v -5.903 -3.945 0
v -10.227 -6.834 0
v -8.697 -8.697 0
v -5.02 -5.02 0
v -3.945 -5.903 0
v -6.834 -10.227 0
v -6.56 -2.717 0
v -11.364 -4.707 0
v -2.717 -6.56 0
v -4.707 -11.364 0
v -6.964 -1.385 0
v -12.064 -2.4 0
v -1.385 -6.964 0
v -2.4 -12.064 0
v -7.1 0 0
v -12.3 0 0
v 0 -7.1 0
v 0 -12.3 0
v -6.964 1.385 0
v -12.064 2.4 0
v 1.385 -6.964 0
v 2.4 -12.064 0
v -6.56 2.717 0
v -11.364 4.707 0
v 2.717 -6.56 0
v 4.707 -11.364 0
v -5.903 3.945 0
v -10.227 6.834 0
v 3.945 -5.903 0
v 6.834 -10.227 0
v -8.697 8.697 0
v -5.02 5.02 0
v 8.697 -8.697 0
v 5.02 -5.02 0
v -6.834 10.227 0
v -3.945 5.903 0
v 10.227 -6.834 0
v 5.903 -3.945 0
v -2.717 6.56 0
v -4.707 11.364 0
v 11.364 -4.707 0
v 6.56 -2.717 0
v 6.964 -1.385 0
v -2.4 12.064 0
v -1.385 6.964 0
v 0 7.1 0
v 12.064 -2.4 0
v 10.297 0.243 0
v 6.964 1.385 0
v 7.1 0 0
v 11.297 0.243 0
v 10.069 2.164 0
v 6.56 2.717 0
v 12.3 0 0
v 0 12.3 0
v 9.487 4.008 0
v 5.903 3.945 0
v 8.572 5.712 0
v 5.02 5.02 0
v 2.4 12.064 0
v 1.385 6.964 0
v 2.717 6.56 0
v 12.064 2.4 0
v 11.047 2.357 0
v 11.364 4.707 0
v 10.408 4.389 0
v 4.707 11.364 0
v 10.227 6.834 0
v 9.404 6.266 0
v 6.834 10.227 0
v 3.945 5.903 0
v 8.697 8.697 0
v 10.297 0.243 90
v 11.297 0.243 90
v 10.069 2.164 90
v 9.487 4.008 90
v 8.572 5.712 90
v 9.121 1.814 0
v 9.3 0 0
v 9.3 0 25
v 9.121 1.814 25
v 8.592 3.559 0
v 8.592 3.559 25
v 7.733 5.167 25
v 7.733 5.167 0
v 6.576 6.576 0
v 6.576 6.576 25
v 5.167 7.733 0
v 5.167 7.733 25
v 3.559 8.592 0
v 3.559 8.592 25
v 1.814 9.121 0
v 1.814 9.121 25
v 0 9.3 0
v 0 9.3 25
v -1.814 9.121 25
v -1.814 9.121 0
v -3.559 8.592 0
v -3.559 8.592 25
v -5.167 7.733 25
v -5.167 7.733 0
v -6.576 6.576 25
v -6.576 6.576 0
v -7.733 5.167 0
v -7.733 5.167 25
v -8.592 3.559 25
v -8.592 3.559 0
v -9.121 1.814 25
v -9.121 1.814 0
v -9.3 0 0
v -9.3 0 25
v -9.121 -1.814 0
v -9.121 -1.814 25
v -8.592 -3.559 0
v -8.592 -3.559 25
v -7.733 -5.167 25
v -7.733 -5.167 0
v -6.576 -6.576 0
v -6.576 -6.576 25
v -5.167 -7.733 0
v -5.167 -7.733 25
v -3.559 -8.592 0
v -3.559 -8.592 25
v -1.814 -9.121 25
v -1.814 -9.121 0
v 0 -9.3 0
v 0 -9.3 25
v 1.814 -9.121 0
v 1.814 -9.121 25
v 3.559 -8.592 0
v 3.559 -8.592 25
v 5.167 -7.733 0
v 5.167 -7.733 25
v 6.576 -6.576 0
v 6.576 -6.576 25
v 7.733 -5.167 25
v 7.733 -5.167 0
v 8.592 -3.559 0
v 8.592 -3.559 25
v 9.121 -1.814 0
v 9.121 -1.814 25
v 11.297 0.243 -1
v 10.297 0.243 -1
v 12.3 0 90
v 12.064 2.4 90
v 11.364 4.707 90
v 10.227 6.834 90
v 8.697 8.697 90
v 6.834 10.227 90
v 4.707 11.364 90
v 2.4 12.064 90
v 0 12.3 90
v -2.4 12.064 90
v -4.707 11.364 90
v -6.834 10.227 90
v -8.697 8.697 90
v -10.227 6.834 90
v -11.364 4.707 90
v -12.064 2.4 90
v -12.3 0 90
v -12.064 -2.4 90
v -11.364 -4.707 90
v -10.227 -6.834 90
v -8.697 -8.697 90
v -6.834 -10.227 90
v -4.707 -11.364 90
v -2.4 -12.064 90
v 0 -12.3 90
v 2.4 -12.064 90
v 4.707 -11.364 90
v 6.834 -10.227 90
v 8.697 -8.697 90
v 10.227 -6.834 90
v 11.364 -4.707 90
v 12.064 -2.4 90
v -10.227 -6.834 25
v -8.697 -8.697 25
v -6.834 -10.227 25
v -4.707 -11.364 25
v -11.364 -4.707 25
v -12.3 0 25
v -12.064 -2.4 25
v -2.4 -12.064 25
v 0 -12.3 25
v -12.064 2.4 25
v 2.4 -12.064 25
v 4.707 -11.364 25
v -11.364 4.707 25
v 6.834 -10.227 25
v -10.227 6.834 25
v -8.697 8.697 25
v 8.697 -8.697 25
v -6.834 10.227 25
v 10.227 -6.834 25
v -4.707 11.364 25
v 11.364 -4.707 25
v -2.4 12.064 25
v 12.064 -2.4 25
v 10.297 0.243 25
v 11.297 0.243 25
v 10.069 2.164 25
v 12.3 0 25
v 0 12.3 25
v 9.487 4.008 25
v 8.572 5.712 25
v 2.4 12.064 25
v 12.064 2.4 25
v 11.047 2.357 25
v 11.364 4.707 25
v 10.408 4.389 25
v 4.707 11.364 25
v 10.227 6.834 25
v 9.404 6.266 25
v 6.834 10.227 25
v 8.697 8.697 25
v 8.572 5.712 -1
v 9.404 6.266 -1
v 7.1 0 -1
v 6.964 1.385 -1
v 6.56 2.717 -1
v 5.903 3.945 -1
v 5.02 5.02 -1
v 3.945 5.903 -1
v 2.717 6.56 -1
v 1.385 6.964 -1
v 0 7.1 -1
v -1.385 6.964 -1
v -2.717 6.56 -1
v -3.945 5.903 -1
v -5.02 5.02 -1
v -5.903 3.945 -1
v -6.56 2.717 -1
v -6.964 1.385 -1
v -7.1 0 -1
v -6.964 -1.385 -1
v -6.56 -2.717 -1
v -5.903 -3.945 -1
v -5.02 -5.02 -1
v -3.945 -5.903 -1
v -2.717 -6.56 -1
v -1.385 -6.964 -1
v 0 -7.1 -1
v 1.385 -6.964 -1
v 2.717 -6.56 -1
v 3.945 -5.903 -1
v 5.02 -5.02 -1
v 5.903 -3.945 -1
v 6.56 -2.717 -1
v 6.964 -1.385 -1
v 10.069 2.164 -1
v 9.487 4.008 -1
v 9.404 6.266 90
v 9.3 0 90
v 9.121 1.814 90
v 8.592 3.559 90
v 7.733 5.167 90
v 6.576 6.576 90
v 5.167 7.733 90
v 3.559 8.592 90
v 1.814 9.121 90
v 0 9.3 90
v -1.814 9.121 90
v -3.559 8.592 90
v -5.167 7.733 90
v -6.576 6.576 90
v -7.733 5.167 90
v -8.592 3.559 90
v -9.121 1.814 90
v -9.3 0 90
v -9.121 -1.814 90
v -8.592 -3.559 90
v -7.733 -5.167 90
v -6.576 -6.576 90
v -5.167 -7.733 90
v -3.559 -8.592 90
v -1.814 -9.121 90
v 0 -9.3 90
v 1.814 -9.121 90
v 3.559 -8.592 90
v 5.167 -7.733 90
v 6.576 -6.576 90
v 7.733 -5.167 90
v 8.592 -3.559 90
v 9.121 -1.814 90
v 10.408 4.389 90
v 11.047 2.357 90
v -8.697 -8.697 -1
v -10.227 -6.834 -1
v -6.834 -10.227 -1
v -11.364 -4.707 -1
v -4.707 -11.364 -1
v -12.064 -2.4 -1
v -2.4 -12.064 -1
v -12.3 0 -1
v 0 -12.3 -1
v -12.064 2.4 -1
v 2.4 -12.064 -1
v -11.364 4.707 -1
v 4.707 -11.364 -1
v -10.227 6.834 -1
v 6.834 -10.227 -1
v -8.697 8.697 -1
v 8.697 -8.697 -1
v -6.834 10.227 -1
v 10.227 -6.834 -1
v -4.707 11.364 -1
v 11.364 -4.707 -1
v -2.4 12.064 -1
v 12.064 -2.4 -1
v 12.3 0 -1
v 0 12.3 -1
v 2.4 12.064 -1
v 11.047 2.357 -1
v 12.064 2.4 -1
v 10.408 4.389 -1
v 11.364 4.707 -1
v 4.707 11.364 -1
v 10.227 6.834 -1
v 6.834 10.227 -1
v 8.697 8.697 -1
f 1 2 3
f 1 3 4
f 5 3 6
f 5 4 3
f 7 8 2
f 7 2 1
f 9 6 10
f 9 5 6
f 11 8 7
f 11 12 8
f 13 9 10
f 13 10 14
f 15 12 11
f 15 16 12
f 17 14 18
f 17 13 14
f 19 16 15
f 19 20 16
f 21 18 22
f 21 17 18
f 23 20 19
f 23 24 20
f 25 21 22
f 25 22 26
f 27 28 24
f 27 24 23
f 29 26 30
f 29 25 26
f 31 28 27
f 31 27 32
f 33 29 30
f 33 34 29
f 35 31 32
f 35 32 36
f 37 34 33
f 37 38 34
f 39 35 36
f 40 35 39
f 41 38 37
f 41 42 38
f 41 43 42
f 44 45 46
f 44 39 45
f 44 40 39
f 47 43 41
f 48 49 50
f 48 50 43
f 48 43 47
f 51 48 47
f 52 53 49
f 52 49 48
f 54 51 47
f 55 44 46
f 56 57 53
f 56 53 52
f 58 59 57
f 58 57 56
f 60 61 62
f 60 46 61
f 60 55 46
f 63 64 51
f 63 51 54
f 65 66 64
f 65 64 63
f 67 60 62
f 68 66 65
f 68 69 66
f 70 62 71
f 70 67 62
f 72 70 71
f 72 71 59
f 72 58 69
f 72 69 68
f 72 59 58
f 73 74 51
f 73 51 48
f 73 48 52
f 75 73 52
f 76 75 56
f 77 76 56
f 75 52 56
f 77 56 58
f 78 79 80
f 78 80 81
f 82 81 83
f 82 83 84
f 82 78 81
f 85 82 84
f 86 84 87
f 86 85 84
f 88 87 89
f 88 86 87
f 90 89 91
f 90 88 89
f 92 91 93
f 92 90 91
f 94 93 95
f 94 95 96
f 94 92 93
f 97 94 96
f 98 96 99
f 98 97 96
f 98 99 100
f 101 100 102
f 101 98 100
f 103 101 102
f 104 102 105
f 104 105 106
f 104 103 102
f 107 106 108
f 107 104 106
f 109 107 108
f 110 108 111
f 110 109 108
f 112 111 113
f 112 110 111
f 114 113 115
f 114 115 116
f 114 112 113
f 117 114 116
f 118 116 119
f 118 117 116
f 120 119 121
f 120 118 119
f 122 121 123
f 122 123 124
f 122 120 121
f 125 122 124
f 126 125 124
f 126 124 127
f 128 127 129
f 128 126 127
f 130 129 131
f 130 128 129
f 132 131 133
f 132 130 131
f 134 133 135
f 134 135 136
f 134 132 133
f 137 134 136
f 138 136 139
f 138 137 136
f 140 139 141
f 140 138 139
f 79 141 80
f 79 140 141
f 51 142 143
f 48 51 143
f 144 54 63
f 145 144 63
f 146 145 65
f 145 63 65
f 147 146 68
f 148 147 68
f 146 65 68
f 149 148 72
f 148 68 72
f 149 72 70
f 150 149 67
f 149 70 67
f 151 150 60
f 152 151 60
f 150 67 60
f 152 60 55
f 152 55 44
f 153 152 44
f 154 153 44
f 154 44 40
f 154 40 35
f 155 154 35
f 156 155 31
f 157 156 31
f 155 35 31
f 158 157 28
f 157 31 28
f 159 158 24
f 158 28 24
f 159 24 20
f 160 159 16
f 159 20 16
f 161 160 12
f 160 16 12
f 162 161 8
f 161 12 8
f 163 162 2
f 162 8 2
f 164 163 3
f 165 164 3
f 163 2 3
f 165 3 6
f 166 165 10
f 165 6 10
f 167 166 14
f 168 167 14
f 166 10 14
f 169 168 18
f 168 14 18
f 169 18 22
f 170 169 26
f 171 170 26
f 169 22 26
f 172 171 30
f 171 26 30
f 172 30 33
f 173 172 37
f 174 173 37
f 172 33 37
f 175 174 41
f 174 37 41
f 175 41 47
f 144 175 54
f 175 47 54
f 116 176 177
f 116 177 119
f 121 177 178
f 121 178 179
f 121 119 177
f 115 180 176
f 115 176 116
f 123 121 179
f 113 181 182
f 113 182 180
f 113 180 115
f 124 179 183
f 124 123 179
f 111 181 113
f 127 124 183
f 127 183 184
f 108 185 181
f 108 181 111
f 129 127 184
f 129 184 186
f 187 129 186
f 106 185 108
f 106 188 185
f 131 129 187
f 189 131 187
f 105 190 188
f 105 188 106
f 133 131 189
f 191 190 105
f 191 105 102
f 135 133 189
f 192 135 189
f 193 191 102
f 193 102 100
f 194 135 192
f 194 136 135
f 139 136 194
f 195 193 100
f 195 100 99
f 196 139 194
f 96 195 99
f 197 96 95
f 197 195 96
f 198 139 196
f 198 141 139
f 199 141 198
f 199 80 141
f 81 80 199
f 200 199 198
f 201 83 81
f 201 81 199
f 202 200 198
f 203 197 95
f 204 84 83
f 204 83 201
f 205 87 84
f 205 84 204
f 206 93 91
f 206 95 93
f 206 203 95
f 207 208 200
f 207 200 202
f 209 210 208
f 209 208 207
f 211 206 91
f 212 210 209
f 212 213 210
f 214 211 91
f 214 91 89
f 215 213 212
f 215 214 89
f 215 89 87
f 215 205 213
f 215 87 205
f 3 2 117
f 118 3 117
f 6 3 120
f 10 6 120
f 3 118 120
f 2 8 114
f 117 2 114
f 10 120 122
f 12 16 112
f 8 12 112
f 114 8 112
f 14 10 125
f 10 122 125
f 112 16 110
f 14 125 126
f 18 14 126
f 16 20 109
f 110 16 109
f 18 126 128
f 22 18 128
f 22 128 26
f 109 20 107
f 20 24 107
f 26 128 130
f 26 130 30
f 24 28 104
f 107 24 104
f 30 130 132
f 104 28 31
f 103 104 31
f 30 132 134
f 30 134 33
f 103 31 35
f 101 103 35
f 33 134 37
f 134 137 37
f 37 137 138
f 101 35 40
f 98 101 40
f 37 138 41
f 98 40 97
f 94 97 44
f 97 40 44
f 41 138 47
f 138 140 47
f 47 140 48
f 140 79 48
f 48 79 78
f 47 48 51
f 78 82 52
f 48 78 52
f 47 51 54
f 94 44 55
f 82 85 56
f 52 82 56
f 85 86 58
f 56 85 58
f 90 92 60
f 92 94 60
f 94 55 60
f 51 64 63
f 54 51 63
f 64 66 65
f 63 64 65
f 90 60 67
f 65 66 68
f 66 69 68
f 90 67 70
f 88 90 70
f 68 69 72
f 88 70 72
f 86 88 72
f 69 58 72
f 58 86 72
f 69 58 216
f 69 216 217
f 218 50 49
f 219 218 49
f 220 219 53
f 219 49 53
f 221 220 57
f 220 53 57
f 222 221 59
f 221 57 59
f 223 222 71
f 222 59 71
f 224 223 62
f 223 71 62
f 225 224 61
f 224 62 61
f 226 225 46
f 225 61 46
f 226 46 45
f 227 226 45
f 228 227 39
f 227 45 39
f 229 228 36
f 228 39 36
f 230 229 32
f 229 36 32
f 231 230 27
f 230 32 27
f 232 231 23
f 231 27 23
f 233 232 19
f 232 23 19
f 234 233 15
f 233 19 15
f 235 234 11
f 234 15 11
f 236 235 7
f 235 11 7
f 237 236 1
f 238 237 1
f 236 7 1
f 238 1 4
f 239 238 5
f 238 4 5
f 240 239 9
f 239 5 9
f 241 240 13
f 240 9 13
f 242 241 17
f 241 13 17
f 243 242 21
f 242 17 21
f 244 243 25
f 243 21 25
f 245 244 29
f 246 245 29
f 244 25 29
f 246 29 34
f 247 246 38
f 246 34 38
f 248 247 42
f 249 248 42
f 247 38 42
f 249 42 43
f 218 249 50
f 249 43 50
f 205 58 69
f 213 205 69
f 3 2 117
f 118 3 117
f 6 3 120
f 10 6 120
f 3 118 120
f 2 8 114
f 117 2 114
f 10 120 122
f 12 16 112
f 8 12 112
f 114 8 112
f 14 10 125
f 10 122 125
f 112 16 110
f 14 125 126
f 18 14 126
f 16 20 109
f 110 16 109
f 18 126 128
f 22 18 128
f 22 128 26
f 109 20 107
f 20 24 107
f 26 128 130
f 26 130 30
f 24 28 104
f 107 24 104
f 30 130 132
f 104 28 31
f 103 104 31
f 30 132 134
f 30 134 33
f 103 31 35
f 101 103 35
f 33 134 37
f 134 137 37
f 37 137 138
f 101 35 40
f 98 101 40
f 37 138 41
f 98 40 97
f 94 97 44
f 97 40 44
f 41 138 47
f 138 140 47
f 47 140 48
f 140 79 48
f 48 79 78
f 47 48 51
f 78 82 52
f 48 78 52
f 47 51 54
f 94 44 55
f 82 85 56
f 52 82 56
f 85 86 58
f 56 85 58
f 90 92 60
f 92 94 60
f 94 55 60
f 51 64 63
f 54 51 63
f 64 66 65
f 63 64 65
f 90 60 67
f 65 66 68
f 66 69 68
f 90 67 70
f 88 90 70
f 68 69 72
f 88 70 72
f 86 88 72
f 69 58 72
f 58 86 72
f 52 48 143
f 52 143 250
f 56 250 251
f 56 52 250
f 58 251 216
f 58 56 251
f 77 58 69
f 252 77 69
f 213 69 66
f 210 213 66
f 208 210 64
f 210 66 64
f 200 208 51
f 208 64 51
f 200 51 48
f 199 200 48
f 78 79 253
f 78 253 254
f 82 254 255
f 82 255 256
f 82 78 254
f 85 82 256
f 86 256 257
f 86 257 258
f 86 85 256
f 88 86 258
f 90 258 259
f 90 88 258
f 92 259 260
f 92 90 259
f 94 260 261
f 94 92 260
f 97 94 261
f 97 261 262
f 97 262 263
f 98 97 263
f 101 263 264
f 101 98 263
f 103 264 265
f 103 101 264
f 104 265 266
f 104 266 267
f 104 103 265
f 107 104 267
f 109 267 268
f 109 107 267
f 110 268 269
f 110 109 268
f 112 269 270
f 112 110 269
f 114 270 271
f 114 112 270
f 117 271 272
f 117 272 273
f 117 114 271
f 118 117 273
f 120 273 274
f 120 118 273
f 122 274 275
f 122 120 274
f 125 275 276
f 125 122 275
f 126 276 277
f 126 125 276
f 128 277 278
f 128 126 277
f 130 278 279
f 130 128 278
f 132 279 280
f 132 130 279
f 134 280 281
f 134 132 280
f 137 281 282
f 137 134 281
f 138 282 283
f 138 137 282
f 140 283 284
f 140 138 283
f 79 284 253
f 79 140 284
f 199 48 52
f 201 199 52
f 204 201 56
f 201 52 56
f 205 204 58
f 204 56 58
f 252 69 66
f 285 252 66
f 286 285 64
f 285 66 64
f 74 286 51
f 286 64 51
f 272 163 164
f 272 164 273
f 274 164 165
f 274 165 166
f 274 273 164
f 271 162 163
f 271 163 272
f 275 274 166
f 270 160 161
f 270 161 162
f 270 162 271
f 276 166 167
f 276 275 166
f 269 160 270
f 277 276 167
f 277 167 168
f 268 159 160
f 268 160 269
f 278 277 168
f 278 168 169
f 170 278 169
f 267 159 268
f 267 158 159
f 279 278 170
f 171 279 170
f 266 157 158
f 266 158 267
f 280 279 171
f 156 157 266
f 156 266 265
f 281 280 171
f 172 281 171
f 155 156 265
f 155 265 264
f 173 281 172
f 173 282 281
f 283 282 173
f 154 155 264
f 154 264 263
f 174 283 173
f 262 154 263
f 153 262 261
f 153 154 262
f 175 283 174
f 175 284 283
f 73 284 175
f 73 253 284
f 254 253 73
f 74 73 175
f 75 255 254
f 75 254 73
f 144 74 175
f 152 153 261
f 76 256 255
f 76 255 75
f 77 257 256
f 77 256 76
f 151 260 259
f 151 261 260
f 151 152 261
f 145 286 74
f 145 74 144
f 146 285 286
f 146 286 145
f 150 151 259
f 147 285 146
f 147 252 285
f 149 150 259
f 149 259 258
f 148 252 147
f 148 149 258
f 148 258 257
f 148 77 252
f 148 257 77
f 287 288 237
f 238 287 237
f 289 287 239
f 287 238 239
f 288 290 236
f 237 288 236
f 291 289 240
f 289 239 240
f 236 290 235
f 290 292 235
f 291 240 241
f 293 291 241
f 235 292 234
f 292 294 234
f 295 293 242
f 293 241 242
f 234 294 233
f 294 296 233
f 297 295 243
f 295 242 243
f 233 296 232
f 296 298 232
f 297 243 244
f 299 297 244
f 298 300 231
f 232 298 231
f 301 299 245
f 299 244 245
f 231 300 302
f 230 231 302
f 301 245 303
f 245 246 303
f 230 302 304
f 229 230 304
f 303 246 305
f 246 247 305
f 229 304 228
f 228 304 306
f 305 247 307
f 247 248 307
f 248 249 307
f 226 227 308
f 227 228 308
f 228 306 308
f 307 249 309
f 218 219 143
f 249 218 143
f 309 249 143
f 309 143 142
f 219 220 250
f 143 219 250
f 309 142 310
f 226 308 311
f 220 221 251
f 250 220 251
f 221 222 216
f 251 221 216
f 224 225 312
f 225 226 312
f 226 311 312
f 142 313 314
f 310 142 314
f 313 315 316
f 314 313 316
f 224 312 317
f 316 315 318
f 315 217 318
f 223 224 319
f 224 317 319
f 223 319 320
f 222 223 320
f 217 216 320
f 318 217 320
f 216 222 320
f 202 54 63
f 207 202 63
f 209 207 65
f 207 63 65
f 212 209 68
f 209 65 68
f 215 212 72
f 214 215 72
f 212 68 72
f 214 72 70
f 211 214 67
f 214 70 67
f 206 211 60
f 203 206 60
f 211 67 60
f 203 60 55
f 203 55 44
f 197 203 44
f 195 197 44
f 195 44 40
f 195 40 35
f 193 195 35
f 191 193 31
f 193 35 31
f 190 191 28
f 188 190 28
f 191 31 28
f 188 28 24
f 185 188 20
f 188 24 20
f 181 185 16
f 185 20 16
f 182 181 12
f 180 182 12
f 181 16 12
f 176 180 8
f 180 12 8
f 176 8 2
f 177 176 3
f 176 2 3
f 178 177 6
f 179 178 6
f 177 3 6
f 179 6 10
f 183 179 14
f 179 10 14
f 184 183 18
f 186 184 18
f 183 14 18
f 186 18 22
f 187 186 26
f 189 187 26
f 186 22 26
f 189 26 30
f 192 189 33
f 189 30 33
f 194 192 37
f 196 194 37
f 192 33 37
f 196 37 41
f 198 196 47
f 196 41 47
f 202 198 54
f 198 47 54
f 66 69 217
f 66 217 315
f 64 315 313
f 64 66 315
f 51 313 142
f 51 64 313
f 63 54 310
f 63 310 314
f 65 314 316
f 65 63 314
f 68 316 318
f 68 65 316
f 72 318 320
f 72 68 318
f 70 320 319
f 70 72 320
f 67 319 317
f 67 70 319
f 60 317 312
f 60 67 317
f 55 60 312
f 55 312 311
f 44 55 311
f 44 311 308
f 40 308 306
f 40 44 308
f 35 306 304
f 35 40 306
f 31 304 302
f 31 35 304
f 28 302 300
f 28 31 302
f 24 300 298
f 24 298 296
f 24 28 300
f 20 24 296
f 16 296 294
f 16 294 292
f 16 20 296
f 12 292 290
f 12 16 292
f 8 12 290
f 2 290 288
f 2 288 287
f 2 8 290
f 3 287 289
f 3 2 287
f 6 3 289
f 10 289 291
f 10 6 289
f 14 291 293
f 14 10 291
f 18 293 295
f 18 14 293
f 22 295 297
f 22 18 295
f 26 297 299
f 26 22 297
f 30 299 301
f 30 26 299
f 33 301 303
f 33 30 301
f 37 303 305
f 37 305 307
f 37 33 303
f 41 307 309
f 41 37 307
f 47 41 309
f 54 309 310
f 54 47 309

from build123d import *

# Parameters (mm, degrees)
F0_R     = 12.3
F0_R_2   = 9.3
F1_DEPTH = 90
F0_R_3   = 7.1
F2_DEPTH = 1
F3_DEPTH = 25


with BuildPart() as f1:
    # F0 (on Top) → F1 (new body)
    with BuildSketch(Plane.XY):
        Circle(F0_R)
        Circle(F0_R_2, mode=Mode.SUBTRACT)
        with BuildLine():
            Line((11.297389, 0.242893), (10.297389, 0.242893))
            ThreePointArc((10.297389, 0.242893), (9.821725, 3.099395), (8.571677, 5.711529))
            Line((8.571677, 5.711529), (9.403648, 6.265893))
            ThreePointArc((9.403648, 6.265893), (10.775075, 3.387881), (11.297389, 0.242893))
        make_face(mode=Mode.SUBTRACT)
    extrude(amount=F1_DEPTH)


with BuildPart() as f2:
    # F0 (on Top) → F2 (new body)
    with BuildSketch(Plane.XY):
        Circle(F0_R)
        Circle(F0_R_2, mode=Mode.SUBTRACT)
        with BuildLine():
            Line((11.297389, 0.242893), (10.297389, 0.242893))
            ThreePointArc((10.297389, 0.242893), (9.821725, 3.099395), (8.571677, 5.711529))
            Line((8.571677, 5.711529), (9.403648, 6.265893))
            ThreePointArc((9.403648, 6.265893), (10.775075, 3.387881), (11.297389, 0.242893))
        make_face(mode=Mode.SUBTRACT)
        Circle(F0_R_2)
        Circle(F0_R_3, mode=Mode.SUBTRACT)
    extrude(amount=-F2_DEPTH)


with BuildPart() as f3:
    # F0 (on Top) → F3 (new body)
    with BuildSketch(Plane.XY):
        Circle(F0_R)
        Circle(F0_R_2, mode=Mode.SUBTRACT)
        with BuildLine():
            Line((11.297389, 0.242893), (10.297389, 0.242893))
            ThreePointArc((10.297389, 0.242893), (9.821725, 3.099395), (8.571677, 5.711529))
            Line((8.571677, 5.711529), (9.403648, 6.265893))
            ThreePointArc((9.403648, 6.265893), (10.775075, 3.387881), (11.297389, 0.242893))
        make_face(mode=Mode.SUBTRACT)
    extrude(amount=F3_DEPTH)


solid = Compound([f1.part, f2.part, f3.part])
